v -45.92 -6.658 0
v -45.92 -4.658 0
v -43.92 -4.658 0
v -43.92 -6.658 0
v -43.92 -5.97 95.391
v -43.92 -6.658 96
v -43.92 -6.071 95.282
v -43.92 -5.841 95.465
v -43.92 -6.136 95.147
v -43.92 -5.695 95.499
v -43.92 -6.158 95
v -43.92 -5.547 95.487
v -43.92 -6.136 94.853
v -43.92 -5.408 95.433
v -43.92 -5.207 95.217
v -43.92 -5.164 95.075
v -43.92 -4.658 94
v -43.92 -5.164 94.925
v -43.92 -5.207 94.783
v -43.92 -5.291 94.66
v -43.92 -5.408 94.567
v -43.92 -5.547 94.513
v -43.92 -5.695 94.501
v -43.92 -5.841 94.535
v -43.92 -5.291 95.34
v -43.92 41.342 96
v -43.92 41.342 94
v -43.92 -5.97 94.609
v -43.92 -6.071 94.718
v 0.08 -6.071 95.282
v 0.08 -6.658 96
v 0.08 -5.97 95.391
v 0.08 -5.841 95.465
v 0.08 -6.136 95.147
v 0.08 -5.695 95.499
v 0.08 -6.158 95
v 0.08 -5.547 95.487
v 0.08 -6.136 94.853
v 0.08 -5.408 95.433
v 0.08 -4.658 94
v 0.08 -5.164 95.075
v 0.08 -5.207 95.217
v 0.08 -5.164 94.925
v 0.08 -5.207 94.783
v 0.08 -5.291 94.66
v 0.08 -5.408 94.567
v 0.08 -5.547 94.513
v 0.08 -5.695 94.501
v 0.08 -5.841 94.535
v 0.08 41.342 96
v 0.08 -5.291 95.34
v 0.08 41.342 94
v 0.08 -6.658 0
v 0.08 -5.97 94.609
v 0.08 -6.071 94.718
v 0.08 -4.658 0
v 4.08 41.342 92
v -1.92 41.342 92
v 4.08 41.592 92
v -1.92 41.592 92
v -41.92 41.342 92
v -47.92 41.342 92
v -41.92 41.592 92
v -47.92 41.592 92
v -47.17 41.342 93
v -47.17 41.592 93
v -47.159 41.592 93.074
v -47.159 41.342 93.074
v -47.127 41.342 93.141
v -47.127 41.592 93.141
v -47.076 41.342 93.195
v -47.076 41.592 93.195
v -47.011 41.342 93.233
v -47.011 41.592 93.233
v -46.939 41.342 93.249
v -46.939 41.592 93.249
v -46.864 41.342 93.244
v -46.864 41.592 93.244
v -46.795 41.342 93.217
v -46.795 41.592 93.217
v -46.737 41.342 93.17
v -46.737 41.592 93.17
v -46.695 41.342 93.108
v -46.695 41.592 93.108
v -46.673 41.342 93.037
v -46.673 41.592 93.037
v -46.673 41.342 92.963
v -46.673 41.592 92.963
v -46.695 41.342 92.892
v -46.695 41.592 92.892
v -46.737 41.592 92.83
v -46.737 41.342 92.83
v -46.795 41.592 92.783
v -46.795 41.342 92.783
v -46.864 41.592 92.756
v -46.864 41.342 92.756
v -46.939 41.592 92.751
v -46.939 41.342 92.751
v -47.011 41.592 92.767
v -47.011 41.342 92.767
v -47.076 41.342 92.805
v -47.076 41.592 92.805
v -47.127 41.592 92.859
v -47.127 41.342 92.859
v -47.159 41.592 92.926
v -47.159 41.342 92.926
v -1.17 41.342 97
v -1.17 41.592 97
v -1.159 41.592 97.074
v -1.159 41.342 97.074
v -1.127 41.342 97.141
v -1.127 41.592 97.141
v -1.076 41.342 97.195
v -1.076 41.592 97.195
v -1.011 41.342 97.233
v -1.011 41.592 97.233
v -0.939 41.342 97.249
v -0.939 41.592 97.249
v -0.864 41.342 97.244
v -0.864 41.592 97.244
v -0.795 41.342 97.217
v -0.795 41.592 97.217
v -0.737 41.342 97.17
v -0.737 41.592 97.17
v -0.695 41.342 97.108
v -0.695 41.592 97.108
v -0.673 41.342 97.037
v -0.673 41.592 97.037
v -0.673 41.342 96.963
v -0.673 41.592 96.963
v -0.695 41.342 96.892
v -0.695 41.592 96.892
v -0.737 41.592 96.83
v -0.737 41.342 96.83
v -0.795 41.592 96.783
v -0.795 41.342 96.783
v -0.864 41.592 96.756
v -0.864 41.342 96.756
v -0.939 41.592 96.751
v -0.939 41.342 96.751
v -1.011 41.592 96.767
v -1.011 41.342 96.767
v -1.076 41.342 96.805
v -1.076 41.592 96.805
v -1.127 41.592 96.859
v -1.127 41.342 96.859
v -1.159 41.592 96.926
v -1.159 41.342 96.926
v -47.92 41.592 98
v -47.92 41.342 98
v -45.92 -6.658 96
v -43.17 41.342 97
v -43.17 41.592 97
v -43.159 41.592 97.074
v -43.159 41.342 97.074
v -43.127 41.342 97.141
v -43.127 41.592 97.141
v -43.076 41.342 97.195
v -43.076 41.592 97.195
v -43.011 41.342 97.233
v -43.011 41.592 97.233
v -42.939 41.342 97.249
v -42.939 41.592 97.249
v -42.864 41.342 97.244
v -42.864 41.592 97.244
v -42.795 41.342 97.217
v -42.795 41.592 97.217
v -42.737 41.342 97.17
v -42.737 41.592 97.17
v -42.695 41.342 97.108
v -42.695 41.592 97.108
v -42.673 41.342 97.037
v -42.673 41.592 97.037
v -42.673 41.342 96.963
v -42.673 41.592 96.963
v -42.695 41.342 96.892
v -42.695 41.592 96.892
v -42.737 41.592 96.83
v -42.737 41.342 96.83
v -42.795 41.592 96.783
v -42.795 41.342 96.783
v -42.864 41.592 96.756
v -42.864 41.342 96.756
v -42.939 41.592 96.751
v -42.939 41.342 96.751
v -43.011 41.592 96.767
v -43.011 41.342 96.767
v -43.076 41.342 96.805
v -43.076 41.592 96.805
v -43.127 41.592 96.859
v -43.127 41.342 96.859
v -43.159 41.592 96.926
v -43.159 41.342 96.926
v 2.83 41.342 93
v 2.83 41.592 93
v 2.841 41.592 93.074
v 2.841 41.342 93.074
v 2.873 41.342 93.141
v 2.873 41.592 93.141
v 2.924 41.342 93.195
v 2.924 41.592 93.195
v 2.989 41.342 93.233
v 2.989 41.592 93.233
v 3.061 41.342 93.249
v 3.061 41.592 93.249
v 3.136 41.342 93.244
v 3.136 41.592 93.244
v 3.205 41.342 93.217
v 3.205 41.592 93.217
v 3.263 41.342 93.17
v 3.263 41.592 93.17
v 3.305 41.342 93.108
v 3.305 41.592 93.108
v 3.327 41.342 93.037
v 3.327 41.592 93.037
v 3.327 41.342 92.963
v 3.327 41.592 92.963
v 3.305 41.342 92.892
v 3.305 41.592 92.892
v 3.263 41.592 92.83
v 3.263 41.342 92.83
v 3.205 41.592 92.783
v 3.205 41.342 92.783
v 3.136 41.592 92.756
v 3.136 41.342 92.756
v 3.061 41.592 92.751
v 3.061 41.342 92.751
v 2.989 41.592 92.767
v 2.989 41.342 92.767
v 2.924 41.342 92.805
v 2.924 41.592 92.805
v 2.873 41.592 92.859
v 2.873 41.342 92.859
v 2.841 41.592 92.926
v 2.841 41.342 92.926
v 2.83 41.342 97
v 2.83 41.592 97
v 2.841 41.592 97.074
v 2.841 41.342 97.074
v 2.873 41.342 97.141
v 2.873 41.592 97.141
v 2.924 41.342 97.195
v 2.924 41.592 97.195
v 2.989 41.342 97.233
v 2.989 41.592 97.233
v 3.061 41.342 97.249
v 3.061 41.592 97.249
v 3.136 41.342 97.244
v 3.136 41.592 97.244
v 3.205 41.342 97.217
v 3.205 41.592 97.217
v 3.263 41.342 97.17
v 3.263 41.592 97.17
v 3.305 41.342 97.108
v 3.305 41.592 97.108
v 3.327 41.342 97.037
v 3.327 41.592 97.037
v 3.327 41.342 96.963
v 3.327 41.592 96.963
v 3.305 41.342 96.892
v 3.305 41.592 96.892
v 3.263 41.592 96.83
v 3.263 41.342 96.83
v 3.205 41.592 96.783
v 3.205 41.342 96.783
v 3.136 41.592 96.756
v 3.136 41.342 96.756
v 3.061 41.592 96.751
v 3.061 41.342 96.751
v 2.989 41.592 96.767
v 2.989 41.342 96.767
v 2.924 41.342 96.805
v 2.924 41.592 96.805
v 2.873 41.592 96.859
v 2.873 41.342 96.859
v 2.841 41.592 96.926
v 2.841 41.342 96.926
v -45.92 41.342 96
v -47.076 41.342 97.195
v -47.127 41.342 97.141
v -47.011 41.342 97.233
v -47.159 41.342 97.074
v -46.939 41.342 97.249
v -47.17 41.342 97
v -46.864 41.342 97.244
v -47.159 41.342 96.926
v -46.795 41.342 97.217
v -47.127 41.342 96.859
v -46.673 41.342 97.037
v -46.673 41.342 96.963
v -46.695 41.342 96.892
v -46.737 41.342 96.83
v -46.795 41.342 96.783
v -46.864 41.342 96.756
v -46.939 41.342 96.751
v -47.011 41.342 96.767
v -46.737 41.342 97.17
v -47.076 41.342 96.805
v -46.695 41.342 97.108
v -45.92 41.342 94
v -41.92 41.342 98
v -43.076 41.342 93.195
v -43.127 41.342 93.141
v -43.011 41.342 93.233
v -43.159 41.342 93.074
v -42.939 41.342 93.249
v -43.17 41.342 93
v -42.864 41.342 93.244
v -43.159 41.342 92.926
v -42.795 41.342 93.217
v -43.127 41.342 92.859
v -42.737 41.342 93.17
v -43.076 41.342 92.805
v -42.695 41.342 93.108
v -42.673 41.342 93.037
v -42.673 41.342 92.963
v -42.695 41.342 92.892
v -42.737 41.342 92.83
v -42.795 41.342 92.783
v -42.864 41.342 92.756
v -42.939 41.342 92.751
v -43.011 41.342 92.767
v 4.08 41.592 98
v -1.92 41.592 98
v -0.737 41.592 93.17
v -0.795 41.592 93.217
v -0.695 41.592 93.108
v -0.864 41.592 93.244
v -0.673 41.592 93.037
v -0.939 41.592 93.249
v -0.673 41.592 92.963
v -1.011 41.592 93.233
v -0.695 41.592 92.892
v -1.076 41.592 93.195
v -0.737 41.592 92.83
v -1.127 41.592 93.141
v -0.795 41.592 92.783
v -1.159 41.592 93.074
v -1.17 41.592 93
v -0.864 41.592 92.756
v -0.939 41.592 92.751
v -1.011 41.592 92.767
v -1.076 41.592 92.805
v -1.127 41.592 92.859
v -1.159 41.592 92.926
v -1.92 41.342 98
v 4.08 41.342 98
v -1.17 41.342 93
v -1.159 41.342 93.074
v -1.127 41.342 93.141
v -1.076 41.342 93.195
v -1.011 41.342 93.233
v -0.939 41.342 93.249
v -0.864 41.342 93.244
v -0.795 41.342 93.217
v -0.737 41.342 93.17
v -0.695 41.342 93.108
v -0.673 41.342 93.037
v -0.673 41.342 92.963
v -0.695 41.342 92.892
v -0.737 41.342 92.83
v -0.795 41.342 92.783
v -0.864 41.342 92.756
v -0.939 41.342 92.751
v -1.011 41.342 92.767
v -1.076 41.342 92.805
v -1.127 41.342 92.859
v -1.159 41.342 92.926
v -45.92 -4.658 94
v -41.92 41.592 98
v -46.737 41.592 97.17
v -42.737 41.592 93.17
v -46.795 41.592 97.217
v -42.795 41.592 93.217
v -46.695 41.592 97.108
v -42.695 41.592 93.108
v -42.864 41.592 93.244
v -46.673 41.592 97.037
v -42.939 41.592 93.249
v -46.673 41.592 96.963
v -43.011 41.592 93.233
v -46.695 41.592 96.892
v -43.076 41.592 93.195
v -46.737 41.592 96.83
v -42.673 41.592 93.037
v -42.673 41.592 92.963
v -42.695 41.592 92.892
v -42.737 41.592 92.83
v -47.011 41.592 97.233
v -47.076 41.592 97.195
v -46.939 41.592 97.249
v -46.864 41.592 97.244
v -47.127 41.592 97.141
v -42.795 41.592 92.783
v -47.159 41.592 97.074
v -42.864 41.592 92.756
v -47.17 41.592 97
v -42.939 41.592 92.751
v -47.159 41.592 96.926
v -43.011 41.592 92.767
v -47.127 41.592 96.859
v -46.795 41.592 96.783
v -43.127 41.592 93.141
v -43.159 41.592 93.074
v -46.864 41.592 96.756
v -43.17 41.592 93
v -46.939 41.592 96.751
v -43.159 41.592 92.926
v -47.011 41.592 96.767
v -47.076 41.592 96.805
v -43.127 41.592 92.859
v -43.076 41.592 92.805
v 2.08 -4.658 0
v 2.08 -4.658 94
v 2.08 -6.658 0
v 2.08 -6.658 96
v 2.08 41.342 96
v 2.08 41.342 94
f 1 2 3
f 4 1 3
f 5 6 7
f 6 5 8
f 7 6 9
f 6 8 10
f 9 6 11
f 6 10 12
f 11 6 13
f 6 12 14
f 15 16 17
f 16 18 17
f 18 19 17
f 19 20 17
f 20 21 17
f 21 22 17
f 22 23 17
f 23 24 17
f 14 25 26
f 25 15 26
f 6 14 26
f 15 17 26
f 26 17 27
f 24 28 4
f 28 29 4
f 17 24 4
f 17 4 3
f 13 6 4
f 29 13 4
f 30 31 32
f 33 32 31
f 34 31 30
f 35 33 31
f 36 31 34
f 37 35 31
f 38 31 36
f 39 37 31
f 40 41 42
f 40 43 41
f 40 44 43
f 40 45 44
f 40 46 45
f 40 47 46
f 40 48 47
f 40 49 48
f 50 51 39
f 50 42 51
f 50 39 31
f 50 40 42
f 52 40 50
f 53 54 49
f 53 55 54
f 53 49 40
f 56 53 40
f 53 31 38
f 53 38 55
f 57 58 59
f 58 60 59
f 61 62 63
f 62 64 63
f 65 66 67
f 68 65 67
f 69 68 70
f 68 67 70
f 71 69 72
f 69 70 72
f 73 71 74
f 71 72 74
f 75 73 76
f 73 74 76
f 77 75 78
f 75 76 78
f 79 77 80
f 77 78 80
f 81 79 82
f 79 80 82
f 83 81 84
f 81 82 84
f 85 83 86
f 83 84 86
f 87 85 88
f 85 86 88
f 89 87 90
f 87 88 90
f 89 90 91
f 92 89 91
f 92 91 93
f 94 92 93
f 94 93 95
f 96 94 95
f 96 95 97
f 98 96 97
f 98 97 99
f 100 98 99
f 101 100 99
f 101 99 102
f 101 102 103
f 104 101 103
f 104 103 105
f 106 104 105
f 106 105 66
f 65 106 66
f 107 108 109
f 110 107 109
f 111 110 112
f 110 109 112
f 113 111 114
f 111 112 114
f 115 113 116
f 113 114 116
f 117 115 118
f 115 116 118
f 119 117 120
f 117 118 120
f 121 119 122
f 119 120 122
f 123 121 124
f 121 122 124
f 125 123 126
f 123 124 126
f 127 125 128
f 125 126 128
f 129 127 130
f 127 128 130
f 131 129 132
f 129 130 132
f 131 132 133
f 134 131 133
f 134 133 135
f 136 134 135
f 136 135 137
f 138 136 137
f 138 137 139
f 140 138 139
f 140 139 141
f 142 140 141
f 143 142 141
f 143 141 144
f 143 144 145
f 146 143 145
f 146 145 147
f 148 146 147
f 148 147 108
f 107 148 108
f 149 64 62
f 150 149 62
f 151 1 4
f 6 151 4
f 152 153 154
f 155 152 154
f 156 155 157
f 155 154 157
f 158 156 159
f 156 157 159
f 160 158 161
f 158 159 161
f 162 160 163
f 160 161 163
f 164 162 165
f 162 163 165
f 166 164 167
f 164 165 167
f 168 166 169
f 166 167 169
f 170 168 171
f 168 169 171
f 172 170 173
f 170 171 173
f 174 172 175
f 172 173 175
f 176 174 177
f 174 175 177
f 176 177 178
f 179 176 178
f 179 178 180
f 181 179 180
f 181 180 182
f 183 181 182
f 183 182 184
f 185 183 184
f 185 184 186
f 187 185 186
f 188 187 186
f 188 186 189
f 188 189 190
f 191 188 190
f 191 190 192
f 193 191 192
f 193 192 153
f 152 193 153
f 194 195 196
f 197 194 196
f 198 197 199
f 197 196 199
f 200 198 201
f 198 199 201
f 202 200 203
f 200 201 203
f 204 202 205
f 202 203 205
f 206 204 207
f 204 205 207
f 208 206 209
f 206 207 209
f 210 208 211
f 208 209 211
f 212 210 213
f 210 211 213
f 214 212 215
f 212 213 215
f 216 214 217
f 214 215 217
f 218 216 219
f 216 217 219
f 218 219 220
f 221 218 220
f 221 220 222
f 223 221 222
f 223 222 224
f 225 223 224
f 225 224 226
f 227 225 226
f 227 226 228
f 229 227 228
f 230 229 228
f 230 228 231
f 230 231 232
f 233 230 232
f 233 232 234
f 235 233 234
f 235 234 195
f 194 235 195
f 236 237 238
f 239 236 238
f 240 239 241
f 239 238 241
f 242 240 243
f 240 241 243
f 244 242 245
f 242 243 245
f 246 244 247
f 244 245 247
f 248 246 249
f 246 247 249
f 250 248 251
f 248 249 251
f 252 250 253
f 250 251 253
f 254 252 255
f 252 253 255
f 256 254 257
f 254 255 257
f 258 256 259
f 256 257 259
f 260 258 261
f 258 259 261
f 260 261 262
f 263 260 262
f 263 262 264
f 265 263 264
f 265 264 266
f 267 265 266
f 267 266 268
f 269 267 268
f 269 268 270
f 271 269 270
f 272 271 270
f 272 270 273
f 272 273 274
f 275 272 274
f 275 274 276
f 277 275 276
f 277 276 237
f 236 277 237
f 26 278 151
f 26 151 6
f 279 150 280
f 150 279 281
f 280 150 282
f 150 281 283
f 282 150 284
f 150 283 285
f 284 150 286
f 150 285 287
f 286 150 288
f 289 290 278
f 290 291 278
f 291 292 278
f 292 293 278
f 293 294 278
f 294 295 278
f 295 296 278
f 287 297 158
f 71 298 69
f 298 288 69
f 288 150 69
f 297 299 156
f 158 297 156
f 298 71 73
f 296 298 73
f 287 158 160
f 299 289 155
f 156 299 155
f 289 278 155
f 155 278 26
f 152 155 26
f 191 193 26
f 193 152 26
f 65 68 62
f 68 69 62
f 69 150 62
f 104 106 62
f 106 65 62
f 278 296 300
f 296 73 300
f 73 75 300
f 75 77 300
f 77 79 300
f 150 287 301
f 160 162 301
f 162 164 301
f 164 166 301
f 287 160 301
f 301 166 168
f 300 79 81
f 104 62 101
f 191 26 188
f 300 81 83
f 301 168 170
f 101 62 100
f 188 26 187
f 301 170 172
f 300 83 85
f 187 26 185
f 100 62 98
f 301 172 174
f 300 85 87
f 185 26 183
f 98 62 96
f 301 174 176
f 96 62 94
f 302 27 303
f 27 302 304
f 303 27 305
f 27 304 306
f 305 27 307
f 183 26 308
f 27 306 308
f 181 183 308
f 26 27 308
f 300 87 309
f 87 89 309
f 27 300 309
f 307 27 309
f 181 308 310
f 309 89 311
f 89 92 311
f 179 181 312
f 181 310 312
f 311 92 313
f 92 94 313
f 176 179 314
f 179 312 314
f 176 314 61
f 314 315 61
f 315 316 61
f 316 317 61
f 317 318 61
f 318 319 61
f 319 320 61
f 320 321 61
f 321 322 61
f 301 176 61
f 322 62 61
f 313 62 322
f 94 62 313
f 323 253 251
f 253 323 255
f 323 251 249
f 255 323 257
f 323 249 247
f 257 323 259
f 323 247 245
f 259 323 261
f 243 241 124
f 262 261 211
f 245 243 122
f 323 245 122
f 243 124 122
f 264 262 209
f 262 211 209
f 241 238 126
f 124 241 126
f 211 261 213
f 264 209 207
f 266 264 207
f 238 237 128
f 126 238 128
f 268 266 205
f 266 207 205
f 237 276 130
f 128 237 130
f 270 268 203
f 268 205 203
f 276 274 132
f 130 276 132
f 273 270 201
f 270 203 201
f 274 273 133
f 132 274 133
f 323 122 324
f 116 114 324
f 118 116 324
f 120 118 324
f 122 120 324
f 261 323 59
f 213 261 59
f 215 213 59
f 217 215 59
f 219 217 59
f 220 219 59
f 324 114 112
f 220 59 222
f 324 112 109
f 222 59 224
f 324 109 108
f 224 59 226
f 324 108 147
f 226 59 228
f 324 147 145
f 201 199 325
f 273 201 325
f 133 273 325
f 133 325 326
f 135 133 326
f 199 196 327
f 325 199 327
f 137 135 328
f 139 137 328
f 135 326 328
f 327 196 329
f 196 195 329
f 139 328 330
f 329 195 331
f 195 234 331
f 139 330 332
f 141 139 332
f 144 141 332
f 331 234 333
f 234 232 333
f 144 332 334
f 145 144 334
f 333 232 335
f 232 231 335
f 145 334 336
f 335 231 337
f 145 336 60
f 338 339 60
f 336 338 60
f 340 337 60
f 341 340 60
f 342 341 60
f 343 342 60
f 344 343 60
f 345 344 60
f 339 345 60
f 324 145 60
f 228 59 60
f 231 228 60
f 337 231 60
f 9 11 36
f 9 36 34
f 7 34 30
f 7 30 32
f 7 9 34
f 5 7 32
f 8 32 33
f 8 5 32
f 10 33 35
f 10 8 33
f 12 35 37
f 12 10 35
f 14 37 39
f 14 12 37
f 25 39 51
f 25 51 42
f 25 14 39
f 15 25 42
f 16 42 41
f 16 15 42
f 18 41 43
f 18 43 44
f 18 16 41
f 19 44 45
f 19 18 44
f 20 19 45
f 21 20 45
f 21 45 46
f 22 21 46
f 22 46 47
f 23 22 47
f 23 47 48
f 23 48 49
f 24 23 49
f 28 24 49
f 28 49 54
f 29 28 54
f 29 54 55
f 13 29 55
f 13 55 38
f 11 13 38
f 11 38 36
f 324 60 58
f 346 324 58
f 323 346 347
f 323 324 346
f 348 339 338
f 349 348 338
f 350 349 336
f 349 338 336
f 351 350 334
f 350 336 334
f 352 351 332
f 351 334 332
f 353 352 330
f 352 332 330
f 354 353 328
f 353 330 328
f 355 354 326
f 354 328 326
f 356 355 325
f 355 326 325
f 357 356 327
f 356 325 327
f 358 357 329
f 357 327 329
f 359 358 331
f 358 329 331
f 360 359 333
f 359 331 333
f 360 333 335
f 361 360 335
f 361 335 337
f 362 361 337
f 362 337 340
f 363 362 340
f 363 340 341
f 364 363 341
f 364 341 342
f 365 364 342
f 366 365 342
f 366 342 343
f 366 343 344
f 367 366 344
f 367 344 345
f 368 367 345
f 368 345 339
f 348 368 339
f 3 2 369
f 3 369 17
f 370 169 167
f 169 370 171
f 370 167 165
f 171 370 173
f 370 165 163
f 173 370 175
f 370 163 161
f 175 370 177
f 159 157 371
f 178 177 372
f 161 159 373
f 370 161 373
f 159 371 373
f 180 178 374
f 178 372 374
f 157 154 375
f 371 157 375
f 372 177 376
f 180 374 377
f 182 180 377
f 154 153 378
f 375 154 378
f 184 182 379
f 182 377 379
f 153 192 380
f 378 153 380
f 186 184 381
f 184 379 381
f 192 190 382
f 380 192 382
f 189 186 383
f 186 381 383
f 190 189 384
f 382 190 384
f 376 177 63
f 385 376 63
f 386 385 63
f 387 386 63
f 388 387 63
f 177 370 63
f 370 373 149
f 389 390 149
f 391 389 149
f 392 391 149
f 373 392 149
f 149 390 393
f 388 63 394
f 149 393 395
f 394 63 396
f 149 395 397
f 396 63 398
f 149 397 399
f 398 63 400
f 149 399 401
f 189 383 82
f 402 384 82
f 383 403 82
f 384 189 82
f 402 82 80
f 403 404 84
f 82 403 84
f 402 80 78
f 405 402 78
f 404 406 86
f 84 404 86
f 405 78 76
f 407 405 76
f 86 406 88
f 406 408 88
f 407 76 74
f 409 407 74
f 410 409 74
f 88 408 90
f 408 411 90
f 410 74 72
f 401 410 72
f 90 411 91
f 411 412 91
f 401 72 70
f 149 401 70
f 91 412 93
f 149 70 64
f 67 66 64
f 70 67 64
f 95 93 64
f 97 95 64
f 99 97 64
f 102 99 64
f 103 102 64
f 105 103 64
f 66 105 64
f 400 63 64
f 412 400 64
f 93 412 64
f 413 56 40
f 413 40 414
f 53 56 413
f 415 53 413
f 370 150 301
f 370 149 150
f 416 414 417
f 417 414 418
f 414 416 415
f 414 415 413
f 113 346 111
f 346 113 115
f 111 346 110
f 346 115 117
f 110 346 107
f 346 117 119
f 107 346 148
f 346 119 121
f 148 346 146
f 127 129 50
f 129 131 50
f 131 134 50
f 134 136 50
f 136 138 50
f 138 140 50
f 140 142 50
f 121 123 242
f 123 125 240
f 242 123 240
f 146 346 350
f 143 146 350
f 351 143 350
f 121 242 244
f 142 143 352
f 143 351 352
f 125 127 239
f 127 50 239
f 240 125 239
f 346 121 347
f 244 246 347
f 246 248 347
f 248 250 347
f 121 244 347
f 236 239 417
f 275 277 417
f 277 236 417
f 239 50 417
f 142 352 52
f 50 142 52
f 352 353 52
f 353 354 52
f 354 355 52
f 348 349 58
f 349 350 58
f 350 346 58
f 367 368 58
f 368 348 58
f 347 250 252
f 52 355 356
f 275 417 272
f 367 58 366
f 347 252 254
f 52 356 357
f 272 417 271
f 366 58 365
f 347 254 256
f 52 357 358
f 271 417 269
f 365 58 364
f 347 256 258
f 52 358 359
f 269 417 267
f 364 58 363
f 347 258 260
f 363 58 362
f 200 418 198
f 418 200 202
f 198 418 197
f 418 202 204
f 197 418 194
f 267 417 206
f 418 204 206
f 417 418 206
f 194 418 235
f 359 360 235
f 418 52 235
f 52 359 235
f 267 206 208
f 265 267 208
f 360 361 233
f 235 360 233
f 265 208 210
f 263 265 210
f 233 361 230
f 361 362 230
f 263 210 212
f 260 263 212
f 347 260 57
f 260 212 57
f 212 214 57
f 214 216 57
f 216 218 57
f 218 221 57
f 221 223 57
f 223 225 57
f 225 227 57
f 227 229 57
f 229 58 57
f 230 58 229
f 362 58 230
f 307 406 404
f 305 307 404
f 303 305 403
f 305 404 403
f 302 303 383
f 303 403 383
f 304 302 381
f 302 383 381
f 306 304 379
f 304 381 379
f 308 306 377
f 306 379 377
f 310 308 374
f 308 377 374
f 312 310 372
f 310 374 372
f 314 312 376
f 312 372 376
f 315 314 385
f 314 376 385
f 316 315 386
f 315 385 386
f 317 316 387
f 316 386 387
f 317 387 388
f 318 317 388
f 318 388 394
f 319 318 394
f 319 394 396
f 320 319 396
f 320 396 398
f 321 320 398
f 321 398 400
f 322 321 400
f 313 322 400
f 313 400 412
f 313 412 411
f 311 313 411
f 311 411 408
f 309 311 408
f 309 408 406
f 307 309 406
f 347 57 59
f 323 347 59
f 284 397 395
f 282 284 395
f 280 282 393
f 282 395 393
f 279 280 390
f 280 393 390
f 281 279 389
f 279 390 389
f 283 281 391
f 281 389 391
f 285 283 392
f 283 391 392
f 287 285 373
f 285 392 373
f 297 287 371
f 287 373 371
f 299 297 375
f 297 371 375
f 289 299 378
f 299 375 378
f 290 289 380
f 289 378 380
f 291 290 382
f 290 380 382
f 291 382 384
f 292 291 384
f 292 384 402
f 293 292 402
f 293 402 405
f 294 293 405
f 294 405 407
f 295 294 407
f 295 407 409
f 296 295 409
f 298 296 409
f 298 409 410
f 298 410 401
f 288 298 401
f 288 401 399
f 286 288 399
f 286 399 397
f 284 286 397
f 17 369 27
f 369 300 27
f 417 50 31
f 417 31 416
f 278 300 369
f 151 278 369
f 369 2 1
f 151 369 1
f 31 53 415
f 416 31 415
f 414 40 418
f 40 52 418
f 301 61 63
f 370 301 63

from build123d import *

# Parameters (mm, degrees)
F0_W     = 2
F0_H     = 2
F1_DEPTH = 96
F2_R     = 0.5
F3_DEPTH = 48
F4_START = 92
F4_DEPTH = 6
F5_START = 94
F0_H_2   = 44
F5_DEPTH = 2
F6_R     = 0.25
F7_DEPTH = 0.5
F8_R     = 0.25
F9_DEPTH = 0.5


with BuildPart() as f1:
    # F0 (on Top) → F1 (new body)
    with BuildSketch(Plane.XY):
        with Locations((-44.9200854897, -5.6579317451)):
            Rectangle(F0_W, F0_H)
    extrude(amount=F1_DEPTH)



with BuildPart() as f1b:
    # F0 (on Top) → F1, piece 2 (new body)
    with BuildSketch(Plane.XY):
        with Locations((1.0799145103, -5.6579317451)):
            Rectangle(F0_W, F0_H)
    extrude(amount=F1_DEPTH)


with BuildPart() as f1_1:
    add(f1.part)

    add(f1b.part)  # F3 merges F1b
    # F2 (on face) → F3 (join)
    with BuildSketch(Plane(origin=(-45.9200854897, 0, 0), x_dir=(0, -1, 0), z_dir=(-1, 0, 0))):
        with Locations((5.6579317451, 95)):
            Circle(F2_R)
    extrude(amount=-F3_DEPTH)



with BuildPart() as f4:
    # F0 (on Top) → F4 (new body)
    with BuildSketch(Plane.XY.offset(F4_START)):
        Polygon((-1.9200854897, 41.3420682549), (0.0799145103, 41.3420682549), (2.0799145103, 41.3420682549), (4.0799145103, 41.3420682549), (4.0799145103, 41.5920682549), (-1.9200854897, 41.5920682549), align=None)
    extrude(amount=F4_DEPTH)


with BuildPart() as f4b:
    # F0 (on Top) → F4, piece 2 (new body)
    with BuildSketch(Plane.XY.offset(F4_START)):
        Polygon((-47.9200854897, 41.3420682549), (-45.9200854897, 41.3420682549), (-43.9200854897, 41.3420682549), (-41.9200854897, 41.3420682549), (-41.9200854897, 41.5920682549), (-47.9200854897, 41.5920682549), align=None)
    extrude(amount=F4_DEPTH)


with BuildPart() as f1_2:
    add(f1_1.part)

    add(f4.part)  # F5 merges F4

    add(f4b.part)  # F5 merges F4b
    # F0 (on Top) → F5 (join)
    with BuildSketch(Plane.XY.offset(F5_START)):
        with Locations((-44.9200854897, -3.6579317451)):
            Rectangle(F0_W, F0_H)
        with Locations((1.0799145103, -3.6579317451)):
            Rectangle(F0_W, F0_H)
        with Locations((-44.9200854897, 19.3420682549)):
            Rectangle(F0_W, F0_H_2)
        with Locations((1.0799145103, 19.3420682549)):
            Rectangle(F0_W, F0_H_2)
    extrude(amount=F5_DEPTH)

    # F6 (on face) → F7 (cut)
    with BuildSketch(Plane(origin=(0, 41.5920682549, 0), x_dir=(-1, 0, 0), z_dir=(0, 1, 0))):
        with Locations((46.9200854897, 97)):
            Circle(F6_R)
        with Locations((42.9200854897, 97)):
            Circle(F6_R)
        with Locations((42.9200854897, 93)):
            Circle(F6_R)
        with Locations((46.9200854897, 93)):
            Circle(F6_R)
    extrude(amount=-F7_DEPTH, mode=Mode.SUBTRACT)

    # F8 (on face) → F9 (cut)
    with BuildSketch(Plane(origin=(0, 41.5920682549, 0), x_dir=(-1, 0, 0), z_dir=(0, 1, 0))):
        with Locations((-3.0799145103, 97)):
            Circle(F8_R)
        with Locations((0.9200854897, 97)):
            Circle(F8_R)
        with Locations((0.9200854897, 93)):
            Circle(F8_R)
        with Locations((-3.0799145103, 93)):
            Circle(F8_R)
    extrude(amount=-F9_DEPTH, mode=Mode.SUBTRACT)


solid = f1_2.part
